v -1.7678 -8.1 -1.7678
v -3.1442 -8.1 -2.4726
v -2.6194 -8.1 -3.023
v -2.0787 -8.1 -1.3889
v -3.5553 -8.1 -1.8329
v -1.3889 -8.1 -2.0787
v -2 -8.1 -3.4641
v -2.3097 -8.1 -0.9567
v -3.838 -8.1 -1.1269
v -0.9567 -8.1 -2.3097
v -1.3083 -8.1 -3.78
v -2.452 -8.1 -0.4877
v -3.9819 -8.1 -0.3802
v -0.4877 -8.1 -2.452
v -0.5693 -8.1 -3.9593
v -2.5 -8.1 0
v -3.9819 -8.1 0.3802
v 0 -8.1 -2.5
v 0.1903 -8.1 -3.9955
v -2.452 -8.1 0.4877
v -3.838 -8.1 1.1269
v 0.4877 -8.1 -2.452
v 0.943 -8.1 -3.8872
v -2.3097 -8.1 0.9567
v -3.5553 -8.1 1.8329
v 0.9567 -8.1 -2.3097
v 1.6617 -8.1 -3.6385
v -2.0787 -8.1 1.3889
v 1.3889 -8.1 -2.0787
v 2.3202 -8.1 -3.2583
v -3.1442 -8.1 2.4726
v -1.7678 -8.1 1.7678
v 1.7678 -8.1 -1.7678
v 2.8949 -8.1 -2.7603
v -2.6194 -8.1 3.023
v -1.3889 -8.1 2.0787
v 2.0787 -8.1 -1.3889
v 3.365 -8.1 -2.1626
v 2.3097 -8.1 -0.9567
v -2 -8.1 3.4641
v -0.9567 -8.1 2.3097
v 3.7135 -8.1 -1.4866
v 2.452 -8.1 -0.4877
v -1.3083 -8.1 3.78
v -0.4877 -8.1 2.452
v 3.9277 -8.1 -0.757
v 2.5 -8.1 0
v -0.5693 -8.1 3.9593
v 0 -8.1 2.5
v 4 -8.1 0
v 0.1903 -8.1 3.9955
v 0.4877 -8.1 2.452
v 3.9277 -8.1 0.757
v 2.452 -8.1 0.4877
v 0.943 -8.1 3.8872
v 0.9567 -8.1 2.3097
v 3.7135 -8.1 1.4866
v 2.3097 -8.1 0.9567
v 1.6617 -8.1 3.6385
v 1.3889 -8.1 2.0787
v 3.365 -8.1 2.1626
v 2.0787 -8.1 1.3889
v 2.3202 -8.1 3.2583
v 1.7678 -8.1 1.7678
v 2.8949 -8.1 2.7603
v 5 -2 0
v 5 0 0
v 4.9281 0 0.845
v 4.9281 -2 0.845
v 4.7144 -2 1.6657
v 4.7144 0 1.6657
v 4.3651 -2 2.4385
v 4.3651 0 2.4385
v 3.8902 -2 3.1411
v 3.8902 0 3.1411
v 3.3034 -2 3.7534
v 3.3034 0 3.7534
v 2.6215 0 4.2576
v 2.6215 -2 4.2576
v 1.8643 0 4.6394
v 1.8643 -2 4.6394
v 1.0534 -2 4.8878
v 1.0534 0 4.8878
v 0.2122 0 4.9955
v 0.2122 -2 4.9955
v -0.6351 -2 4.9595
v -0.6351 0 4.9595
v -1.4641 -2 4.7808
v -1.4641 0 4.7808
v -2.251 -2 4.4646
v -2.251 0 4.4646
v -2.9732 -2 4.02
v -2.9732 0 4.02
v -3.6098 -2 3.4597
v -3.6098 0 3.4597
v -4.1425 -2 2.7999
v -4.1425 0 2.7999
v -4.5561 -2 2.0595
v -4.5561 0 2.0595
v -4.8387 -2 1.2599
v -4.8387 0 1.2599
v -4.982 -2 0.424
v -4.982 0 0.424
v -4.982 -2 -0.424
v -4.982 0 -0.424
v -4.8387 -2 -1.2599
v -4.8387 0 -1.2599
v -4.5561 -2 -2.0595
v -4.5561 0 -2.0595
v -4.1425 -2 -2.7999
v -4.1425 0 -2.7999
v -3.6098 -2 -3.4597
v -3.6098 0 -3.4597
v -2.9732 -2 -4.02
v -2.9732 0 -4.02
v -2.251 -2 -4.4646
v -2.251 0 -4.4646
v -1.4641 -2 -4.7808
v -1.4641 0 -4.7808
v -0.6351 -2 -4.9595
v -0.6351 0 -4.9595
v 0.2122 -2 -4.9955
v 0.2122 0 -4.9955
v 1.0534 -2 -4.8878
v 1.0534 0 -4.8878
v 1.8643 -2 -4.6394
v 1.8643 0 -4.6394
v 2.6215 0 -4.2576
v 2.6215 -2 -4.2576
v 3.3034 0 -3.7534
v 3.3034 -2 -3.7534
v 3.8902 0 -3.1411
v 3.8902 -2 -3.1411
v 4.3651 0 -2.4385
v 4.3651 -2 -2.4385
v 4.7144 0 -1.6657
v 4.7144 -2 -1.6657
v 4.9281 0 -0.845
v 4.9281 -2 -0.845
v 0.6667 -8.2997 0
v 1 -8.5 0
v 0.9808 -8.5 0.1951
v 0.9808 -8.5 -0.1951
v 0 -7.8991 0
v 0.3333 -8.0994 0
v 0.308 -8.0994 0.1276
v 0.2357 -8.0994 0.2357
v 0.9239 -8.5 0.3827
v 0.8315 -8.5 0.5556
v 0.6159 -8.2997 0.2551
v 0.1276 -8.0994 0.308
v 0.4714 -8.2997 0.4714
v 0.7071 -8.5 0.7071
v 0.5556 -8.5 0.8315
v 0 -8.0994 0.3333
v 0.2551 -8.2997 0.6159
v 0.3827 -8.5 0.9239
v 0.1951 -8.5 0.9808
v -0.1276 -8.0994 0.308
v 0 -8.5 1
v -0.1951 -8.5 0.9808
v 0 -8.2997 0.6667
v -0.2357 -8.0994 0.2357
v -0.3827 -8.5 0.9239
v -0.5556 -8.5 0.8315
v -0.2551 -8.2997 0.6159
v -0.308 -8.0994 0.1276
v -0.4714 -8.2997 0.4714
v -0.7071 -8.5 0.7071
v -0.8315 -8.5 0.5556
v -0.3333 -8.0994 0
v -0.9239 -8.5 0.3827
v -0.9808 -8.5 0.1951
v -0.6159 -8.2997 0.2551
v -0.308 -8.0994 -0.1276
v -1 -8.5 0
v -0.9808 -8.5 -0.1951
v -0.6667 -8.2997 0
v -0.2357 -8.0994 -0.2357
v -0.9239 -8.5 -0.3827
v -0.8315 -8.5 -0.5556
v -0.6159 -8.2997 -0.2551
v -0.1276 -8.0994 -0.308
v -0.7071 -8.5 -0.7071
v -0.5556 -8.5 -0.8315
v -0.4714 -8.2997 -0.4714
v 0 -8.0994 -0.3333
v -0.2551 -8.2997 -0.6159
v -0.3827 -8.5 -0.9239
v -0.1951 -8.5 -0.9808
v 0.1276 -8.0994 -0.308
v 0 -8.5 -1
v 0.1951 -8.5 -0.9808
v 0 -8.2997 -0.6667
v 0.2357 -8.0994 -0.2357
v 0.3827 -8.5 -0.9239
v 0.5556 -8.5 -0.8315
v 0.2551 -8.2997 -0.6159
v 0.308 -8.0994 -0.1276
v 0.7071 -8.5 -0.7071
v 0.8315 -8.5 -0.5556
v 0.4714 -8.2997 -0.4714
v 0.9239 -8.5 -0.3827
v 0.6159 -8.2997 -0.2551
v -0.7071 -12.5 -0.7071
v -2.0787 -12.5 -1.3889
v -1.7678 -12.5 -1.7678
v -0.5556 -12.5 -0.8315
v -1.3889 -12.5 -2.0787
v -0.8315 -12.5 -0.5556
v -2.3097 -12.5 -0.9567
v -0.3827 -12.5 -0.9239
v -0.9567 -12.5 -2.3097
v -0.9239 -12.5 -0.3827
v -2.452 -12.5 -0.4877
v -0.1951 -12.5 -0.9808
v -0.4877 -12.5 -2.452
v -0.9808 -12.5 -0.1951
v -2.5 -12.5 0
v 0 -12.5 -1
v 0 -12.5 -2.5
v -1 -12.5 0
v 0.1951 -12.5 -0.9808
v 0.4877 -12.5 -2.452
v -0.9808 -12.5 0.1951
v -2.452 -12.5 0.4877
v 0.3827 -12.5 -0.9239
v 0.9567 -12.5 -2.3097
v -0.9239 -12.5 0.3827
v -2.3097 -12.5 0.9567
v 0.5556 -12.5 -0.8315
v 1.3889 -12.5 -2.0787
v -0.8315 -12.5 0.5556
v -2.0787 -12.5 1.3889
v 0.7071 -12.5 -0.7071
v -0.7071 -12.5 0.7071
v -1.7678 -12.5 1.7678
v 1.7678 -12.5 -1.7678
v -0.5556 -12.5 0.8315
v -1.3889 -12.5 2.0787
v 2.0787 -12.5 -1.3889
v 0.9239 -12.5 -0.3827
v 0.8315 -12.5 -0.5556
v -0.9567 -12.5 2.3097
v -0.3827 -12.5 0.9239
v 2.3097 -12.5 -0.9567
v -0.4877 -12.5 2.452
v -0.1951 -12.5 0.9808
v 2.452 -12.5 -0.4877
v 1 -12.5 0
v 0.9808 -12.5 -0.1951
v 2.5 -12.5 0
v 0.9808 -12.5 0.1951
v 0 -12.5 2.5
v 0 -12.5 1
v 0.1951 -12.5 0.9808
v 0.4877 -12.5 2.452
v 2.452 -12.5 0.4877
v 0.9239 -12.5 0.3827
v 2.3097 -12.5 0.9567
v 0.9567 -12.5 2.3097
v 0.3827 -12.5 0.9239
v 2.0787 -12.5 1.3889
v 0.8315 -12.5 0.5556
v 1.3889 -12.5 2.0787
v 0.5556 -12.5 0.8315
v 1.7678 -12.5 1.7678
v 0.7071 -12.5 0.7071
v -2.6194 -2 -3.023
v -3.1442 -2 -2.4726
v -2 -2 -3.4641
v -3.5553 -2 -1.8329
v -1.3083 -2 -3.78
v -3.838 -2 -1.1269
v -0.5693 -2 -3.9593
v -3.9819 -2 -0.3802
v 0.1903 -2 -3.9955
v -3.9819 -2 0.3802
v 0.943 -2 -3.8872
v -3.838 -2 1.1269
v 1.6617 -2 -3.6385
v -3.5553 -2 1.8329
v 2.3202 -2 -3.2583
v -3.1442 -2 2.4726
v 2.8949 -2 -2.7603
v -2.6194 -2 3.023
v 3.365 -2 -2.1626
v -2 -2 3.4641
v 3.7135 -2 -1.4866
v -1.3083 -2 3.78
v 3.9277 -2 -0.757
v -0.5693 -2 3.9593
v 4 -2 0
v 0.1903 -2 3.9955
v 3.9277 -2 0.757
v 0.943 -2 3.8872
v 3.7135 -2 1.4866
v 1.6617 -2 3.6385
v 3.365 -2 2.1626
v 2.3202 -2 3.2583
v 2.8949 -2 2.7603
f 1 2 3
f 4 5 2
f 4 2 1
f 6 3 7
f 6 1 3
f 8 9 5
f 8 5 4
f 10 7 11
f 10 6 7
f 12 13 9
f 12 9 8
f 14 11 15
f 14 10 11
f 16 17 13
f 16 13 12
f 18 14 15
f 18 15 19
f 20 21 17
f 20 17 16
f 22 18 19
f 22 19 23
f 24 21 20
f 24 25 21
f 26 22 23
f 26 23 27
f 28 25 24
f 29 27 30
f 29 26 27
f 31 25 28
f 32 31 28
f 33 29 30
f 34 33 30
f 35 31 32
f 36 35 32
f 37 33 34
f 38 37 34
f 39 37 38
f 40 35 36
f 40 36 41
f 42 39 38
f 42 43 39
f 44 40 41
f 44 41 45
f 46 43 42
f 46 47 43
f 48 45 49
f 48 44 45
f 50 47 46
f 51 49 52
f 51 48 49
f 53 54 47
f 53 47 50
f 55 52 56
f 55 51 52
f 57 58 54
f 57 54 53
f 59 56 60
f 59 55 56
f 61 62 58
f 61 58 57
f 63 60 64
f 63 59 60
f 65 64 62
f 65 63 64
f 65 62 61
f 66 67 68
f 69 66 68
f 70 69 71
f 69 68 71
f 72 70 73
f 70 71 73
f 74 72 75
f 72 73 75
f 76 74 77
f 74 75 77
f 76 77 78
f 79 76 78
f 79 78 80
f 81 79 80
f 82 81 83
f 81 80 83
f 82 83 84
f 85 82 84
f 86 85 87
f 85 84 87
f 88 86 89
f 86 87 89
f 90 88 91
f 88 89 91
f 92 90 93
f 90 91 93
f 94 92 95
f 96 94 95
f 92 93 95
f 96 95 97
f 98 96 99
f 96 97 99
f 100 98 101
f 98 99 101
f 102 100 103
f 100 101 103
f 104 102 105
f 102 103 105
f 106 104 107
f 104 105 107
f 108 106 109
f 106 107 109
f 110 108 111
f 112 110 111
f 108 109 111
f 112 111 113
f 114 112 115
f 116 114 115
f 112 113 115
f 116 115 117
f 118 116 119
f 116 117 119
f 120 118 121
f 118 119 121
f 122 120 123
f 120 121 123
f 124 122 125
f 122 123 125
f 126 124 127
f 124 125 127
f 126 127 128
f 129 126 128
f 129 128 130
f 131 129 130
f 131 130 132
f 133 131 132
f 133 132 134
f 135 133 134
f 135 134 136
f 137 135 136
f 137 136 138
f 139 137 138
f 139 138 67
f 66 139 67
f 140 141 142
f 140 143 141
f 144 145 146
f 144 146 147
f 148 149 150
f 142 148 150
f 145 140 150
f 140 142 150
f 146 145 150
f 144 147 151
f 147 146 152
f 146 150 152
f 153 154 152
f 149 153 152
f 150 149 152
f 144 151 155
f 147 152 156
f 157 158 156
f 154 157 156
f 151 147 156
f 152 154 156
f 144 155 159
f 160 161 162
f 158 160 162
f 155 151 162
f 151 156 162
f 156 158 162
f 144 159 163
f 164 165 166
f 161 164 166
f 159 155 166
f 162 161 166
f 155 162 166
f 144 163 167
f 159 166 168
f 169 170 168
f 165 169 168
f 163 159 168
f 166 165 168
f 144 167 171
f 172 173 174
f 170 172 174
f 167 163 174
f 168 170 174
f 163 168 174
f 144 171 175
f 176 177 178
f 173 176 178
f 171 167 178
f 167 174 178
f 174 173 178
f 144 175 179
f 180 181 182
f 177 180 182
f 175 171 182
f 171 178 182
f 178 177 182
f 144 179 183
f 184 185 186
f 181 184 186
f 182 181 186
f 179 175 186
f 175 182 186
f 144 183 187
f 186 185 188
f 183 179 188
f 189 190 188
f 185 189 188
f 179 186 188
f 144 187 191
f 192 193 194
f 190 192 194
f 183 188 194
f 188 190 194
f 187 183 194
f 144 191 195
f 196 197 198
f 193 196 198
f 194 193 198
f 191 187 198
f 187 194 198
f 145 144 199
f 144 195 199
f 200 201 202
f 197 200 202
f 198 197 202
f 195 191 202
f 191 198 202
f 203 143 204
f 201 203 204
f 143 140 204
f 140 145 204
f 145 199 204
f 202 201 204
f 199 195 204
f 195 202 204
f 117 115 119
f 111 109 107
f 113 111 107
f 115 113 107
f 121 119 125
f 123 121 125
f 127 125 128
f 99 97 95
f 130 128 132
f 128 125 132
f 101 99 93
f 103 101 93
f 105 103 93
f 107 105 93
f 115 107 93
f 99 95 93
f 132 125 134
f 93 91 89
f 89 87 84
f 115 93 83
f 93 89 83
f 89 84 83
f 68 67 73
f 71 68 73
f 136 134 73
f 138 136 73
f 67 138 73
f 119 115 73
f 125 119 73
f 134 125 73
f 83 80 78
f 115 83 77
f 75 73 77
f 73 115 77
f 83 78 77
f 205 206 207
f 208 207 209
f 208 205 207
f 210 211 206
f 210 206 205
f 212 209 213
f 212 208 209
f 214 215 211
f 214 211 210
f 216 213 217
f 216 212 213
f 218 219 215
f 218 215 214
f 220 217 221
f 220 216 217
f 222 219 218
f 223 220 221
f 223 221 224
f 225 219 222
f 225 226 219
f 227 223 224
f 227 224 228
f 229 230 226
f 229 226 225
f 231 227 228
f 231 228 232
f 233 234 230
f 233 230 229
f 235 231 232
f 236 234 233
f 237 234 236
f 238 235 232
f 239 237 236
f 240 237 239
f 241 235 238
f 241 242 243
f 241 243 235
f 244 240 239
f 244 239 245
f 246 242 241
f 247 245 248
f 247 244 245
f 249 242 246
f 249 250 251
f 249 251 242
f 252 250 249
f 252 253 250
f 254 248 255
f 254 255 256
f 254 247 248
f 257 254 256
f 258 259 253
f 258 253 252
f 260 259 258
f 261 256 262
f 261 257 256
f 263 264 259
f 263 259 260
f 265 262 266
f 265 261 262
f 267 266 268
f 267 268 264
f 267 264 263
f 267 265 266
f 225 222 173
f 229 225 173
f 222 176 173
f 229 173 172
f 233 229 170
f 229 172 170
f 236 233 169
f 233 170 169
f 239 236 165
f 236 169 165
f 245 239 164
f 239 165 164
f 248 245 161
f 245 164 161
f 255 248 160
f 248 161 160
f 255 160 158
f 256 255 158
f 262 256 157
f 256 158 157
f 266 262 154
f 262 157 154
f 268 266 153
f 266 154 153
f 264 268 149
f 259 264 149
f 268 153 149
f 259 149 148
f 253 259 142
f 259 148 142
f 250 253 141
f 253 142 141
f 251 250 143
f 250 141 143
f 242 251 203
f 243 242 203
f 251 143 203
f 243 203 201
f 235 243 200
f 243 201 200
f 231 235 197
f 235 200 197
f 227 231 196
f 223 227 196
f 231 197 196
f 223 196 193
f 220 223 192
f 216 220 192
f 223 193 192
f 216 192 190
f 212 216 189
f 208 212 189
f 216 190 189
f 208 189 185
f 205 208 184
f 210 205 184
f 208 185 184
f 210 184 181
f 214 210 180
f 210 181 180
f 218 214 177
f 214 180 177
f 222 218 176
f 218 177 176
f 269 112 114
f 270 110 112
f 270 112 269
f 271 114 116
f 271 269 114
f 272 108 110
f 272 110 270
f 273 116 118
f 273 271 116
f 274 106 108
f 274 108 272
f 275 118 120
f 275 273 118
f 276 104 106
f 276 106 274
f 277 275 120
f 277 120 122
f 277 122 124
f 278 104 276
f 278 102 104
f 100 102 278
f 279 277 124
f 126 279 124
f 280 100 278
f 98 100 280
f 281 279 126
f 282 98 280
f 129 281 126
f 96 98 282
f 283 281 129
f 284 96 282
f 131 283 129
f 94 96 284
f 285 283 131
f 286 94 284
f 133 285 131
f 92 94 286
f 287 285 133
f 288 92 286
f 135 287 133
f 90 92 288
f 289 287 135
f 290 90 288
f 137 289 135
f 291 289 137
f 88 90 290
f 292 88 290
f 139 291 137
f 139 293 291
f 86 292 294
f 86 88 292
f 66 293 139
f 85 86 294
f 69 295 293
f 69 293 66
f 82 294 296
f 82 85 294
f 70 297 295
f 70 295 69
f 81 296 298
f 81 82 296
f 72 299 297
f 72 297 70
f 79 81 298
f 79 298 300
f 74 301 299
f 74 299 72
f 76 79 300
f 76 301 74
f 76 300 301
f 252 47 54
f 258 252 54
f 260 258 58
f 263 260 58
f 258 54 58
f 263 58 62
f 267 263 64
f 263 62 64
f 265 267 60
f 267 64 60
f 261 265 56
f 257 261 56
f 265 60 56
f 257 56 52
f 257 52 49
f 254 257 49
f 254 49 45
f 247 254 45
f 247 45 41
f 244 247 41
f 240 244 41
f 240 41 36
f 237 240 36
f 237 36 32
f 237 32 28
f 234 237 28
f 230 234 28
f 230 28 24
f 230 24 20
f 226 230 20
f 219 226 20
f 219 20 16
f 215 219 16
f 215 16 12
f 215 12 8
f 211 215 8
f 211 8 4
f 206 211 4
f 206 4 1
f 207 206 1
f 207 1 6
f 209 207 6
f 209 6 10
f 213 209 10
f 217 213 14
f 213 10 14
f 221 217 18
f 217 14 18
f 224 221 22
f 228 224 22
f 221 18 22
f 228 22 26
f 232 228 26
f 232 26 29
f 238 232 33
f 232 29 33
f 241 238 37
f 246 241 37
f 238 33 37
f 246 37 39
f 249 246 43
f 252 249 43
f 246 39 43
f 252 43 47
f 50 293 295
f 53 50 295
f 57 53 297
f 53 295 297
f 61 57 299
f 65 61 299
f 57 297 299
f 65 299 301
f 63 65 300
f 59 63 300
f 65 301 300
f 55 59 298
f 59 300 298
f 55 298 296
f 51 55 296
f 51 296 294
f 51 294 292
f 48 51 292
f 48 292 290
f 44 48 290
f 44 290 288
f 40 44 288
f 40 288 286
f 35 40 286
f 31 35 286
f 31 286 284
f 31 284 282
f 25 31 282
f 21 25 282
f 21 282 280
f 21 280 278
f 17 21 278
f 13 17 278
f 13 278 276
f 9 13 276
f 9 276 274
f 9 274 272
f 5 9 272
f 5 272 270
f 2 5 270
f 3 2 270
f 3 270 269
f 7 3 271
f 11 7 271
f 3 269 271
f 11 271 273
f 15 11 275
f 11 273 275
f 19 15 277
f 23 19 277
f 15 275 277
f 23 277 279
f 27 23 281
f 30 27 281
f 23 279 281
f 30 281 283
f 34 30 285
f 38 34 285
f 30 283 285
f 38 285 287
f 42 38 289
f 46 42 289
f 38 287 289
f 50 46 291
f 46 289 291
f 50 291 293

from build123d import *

# Parameters (mm, degrees)
F0_R     = 5
F0_R_2   = 4
F1_DEPTH = 2
F0_R_3   = 2.5
F2_DEPTH = 8.1
F0_R_4   = 1
F3_DEPTH = 12.5
F4_DEPTH = 12.5
F6_D     = 2
F6_DEPTH = 4
F6_TIP   = 0.600860619


with BuildPart() as f1:
    # F0 (on Front) → F1 (new body)
    with BuildSketch(Plane.XZ):
        Circle(F0_R)
        Circle(F0_R_2, mode=Mode.SUBTRACT)
    extrude(amount=F1_DEPTH)

    # F0 (on Front) → F2 (join)
    with BuildSketch(Plane.XZ):
        Circle(F0_R_2)
        Circle(F0_R_3, mode=Mode.SUBTRACT)
    extrude(amount=F2_DEPTH)

    # F0 (on Front) → F3 (join)
    with BuildSketch(Plane.XZ):
        Circle(F0_R_3)
        Circle(F0_R_4, mode=Mode.SUBTRACT)
    extrude(amount=F3_DEPTH)

    # F0 (on Front) → F4 (join)
    with BuildSketch(Plane.XZ):
        Circle(F0_R_4)
    extrude(amount=F4_DEPTH)

    # F6
    with Locations(Plane.XZ.offset(12.5)):
        with Locations((0, 0)):
            Hole(F6_D / 2, depth=F6_DEPTH)
            with Locations((0, 0, -(F6_DEPTH + F6_TIP / 2))):  # 118° drill point
                Cone(0, F6_D / 2, F6_TIP, mode=Mode.SUBTRACT)


solid = f1.part
